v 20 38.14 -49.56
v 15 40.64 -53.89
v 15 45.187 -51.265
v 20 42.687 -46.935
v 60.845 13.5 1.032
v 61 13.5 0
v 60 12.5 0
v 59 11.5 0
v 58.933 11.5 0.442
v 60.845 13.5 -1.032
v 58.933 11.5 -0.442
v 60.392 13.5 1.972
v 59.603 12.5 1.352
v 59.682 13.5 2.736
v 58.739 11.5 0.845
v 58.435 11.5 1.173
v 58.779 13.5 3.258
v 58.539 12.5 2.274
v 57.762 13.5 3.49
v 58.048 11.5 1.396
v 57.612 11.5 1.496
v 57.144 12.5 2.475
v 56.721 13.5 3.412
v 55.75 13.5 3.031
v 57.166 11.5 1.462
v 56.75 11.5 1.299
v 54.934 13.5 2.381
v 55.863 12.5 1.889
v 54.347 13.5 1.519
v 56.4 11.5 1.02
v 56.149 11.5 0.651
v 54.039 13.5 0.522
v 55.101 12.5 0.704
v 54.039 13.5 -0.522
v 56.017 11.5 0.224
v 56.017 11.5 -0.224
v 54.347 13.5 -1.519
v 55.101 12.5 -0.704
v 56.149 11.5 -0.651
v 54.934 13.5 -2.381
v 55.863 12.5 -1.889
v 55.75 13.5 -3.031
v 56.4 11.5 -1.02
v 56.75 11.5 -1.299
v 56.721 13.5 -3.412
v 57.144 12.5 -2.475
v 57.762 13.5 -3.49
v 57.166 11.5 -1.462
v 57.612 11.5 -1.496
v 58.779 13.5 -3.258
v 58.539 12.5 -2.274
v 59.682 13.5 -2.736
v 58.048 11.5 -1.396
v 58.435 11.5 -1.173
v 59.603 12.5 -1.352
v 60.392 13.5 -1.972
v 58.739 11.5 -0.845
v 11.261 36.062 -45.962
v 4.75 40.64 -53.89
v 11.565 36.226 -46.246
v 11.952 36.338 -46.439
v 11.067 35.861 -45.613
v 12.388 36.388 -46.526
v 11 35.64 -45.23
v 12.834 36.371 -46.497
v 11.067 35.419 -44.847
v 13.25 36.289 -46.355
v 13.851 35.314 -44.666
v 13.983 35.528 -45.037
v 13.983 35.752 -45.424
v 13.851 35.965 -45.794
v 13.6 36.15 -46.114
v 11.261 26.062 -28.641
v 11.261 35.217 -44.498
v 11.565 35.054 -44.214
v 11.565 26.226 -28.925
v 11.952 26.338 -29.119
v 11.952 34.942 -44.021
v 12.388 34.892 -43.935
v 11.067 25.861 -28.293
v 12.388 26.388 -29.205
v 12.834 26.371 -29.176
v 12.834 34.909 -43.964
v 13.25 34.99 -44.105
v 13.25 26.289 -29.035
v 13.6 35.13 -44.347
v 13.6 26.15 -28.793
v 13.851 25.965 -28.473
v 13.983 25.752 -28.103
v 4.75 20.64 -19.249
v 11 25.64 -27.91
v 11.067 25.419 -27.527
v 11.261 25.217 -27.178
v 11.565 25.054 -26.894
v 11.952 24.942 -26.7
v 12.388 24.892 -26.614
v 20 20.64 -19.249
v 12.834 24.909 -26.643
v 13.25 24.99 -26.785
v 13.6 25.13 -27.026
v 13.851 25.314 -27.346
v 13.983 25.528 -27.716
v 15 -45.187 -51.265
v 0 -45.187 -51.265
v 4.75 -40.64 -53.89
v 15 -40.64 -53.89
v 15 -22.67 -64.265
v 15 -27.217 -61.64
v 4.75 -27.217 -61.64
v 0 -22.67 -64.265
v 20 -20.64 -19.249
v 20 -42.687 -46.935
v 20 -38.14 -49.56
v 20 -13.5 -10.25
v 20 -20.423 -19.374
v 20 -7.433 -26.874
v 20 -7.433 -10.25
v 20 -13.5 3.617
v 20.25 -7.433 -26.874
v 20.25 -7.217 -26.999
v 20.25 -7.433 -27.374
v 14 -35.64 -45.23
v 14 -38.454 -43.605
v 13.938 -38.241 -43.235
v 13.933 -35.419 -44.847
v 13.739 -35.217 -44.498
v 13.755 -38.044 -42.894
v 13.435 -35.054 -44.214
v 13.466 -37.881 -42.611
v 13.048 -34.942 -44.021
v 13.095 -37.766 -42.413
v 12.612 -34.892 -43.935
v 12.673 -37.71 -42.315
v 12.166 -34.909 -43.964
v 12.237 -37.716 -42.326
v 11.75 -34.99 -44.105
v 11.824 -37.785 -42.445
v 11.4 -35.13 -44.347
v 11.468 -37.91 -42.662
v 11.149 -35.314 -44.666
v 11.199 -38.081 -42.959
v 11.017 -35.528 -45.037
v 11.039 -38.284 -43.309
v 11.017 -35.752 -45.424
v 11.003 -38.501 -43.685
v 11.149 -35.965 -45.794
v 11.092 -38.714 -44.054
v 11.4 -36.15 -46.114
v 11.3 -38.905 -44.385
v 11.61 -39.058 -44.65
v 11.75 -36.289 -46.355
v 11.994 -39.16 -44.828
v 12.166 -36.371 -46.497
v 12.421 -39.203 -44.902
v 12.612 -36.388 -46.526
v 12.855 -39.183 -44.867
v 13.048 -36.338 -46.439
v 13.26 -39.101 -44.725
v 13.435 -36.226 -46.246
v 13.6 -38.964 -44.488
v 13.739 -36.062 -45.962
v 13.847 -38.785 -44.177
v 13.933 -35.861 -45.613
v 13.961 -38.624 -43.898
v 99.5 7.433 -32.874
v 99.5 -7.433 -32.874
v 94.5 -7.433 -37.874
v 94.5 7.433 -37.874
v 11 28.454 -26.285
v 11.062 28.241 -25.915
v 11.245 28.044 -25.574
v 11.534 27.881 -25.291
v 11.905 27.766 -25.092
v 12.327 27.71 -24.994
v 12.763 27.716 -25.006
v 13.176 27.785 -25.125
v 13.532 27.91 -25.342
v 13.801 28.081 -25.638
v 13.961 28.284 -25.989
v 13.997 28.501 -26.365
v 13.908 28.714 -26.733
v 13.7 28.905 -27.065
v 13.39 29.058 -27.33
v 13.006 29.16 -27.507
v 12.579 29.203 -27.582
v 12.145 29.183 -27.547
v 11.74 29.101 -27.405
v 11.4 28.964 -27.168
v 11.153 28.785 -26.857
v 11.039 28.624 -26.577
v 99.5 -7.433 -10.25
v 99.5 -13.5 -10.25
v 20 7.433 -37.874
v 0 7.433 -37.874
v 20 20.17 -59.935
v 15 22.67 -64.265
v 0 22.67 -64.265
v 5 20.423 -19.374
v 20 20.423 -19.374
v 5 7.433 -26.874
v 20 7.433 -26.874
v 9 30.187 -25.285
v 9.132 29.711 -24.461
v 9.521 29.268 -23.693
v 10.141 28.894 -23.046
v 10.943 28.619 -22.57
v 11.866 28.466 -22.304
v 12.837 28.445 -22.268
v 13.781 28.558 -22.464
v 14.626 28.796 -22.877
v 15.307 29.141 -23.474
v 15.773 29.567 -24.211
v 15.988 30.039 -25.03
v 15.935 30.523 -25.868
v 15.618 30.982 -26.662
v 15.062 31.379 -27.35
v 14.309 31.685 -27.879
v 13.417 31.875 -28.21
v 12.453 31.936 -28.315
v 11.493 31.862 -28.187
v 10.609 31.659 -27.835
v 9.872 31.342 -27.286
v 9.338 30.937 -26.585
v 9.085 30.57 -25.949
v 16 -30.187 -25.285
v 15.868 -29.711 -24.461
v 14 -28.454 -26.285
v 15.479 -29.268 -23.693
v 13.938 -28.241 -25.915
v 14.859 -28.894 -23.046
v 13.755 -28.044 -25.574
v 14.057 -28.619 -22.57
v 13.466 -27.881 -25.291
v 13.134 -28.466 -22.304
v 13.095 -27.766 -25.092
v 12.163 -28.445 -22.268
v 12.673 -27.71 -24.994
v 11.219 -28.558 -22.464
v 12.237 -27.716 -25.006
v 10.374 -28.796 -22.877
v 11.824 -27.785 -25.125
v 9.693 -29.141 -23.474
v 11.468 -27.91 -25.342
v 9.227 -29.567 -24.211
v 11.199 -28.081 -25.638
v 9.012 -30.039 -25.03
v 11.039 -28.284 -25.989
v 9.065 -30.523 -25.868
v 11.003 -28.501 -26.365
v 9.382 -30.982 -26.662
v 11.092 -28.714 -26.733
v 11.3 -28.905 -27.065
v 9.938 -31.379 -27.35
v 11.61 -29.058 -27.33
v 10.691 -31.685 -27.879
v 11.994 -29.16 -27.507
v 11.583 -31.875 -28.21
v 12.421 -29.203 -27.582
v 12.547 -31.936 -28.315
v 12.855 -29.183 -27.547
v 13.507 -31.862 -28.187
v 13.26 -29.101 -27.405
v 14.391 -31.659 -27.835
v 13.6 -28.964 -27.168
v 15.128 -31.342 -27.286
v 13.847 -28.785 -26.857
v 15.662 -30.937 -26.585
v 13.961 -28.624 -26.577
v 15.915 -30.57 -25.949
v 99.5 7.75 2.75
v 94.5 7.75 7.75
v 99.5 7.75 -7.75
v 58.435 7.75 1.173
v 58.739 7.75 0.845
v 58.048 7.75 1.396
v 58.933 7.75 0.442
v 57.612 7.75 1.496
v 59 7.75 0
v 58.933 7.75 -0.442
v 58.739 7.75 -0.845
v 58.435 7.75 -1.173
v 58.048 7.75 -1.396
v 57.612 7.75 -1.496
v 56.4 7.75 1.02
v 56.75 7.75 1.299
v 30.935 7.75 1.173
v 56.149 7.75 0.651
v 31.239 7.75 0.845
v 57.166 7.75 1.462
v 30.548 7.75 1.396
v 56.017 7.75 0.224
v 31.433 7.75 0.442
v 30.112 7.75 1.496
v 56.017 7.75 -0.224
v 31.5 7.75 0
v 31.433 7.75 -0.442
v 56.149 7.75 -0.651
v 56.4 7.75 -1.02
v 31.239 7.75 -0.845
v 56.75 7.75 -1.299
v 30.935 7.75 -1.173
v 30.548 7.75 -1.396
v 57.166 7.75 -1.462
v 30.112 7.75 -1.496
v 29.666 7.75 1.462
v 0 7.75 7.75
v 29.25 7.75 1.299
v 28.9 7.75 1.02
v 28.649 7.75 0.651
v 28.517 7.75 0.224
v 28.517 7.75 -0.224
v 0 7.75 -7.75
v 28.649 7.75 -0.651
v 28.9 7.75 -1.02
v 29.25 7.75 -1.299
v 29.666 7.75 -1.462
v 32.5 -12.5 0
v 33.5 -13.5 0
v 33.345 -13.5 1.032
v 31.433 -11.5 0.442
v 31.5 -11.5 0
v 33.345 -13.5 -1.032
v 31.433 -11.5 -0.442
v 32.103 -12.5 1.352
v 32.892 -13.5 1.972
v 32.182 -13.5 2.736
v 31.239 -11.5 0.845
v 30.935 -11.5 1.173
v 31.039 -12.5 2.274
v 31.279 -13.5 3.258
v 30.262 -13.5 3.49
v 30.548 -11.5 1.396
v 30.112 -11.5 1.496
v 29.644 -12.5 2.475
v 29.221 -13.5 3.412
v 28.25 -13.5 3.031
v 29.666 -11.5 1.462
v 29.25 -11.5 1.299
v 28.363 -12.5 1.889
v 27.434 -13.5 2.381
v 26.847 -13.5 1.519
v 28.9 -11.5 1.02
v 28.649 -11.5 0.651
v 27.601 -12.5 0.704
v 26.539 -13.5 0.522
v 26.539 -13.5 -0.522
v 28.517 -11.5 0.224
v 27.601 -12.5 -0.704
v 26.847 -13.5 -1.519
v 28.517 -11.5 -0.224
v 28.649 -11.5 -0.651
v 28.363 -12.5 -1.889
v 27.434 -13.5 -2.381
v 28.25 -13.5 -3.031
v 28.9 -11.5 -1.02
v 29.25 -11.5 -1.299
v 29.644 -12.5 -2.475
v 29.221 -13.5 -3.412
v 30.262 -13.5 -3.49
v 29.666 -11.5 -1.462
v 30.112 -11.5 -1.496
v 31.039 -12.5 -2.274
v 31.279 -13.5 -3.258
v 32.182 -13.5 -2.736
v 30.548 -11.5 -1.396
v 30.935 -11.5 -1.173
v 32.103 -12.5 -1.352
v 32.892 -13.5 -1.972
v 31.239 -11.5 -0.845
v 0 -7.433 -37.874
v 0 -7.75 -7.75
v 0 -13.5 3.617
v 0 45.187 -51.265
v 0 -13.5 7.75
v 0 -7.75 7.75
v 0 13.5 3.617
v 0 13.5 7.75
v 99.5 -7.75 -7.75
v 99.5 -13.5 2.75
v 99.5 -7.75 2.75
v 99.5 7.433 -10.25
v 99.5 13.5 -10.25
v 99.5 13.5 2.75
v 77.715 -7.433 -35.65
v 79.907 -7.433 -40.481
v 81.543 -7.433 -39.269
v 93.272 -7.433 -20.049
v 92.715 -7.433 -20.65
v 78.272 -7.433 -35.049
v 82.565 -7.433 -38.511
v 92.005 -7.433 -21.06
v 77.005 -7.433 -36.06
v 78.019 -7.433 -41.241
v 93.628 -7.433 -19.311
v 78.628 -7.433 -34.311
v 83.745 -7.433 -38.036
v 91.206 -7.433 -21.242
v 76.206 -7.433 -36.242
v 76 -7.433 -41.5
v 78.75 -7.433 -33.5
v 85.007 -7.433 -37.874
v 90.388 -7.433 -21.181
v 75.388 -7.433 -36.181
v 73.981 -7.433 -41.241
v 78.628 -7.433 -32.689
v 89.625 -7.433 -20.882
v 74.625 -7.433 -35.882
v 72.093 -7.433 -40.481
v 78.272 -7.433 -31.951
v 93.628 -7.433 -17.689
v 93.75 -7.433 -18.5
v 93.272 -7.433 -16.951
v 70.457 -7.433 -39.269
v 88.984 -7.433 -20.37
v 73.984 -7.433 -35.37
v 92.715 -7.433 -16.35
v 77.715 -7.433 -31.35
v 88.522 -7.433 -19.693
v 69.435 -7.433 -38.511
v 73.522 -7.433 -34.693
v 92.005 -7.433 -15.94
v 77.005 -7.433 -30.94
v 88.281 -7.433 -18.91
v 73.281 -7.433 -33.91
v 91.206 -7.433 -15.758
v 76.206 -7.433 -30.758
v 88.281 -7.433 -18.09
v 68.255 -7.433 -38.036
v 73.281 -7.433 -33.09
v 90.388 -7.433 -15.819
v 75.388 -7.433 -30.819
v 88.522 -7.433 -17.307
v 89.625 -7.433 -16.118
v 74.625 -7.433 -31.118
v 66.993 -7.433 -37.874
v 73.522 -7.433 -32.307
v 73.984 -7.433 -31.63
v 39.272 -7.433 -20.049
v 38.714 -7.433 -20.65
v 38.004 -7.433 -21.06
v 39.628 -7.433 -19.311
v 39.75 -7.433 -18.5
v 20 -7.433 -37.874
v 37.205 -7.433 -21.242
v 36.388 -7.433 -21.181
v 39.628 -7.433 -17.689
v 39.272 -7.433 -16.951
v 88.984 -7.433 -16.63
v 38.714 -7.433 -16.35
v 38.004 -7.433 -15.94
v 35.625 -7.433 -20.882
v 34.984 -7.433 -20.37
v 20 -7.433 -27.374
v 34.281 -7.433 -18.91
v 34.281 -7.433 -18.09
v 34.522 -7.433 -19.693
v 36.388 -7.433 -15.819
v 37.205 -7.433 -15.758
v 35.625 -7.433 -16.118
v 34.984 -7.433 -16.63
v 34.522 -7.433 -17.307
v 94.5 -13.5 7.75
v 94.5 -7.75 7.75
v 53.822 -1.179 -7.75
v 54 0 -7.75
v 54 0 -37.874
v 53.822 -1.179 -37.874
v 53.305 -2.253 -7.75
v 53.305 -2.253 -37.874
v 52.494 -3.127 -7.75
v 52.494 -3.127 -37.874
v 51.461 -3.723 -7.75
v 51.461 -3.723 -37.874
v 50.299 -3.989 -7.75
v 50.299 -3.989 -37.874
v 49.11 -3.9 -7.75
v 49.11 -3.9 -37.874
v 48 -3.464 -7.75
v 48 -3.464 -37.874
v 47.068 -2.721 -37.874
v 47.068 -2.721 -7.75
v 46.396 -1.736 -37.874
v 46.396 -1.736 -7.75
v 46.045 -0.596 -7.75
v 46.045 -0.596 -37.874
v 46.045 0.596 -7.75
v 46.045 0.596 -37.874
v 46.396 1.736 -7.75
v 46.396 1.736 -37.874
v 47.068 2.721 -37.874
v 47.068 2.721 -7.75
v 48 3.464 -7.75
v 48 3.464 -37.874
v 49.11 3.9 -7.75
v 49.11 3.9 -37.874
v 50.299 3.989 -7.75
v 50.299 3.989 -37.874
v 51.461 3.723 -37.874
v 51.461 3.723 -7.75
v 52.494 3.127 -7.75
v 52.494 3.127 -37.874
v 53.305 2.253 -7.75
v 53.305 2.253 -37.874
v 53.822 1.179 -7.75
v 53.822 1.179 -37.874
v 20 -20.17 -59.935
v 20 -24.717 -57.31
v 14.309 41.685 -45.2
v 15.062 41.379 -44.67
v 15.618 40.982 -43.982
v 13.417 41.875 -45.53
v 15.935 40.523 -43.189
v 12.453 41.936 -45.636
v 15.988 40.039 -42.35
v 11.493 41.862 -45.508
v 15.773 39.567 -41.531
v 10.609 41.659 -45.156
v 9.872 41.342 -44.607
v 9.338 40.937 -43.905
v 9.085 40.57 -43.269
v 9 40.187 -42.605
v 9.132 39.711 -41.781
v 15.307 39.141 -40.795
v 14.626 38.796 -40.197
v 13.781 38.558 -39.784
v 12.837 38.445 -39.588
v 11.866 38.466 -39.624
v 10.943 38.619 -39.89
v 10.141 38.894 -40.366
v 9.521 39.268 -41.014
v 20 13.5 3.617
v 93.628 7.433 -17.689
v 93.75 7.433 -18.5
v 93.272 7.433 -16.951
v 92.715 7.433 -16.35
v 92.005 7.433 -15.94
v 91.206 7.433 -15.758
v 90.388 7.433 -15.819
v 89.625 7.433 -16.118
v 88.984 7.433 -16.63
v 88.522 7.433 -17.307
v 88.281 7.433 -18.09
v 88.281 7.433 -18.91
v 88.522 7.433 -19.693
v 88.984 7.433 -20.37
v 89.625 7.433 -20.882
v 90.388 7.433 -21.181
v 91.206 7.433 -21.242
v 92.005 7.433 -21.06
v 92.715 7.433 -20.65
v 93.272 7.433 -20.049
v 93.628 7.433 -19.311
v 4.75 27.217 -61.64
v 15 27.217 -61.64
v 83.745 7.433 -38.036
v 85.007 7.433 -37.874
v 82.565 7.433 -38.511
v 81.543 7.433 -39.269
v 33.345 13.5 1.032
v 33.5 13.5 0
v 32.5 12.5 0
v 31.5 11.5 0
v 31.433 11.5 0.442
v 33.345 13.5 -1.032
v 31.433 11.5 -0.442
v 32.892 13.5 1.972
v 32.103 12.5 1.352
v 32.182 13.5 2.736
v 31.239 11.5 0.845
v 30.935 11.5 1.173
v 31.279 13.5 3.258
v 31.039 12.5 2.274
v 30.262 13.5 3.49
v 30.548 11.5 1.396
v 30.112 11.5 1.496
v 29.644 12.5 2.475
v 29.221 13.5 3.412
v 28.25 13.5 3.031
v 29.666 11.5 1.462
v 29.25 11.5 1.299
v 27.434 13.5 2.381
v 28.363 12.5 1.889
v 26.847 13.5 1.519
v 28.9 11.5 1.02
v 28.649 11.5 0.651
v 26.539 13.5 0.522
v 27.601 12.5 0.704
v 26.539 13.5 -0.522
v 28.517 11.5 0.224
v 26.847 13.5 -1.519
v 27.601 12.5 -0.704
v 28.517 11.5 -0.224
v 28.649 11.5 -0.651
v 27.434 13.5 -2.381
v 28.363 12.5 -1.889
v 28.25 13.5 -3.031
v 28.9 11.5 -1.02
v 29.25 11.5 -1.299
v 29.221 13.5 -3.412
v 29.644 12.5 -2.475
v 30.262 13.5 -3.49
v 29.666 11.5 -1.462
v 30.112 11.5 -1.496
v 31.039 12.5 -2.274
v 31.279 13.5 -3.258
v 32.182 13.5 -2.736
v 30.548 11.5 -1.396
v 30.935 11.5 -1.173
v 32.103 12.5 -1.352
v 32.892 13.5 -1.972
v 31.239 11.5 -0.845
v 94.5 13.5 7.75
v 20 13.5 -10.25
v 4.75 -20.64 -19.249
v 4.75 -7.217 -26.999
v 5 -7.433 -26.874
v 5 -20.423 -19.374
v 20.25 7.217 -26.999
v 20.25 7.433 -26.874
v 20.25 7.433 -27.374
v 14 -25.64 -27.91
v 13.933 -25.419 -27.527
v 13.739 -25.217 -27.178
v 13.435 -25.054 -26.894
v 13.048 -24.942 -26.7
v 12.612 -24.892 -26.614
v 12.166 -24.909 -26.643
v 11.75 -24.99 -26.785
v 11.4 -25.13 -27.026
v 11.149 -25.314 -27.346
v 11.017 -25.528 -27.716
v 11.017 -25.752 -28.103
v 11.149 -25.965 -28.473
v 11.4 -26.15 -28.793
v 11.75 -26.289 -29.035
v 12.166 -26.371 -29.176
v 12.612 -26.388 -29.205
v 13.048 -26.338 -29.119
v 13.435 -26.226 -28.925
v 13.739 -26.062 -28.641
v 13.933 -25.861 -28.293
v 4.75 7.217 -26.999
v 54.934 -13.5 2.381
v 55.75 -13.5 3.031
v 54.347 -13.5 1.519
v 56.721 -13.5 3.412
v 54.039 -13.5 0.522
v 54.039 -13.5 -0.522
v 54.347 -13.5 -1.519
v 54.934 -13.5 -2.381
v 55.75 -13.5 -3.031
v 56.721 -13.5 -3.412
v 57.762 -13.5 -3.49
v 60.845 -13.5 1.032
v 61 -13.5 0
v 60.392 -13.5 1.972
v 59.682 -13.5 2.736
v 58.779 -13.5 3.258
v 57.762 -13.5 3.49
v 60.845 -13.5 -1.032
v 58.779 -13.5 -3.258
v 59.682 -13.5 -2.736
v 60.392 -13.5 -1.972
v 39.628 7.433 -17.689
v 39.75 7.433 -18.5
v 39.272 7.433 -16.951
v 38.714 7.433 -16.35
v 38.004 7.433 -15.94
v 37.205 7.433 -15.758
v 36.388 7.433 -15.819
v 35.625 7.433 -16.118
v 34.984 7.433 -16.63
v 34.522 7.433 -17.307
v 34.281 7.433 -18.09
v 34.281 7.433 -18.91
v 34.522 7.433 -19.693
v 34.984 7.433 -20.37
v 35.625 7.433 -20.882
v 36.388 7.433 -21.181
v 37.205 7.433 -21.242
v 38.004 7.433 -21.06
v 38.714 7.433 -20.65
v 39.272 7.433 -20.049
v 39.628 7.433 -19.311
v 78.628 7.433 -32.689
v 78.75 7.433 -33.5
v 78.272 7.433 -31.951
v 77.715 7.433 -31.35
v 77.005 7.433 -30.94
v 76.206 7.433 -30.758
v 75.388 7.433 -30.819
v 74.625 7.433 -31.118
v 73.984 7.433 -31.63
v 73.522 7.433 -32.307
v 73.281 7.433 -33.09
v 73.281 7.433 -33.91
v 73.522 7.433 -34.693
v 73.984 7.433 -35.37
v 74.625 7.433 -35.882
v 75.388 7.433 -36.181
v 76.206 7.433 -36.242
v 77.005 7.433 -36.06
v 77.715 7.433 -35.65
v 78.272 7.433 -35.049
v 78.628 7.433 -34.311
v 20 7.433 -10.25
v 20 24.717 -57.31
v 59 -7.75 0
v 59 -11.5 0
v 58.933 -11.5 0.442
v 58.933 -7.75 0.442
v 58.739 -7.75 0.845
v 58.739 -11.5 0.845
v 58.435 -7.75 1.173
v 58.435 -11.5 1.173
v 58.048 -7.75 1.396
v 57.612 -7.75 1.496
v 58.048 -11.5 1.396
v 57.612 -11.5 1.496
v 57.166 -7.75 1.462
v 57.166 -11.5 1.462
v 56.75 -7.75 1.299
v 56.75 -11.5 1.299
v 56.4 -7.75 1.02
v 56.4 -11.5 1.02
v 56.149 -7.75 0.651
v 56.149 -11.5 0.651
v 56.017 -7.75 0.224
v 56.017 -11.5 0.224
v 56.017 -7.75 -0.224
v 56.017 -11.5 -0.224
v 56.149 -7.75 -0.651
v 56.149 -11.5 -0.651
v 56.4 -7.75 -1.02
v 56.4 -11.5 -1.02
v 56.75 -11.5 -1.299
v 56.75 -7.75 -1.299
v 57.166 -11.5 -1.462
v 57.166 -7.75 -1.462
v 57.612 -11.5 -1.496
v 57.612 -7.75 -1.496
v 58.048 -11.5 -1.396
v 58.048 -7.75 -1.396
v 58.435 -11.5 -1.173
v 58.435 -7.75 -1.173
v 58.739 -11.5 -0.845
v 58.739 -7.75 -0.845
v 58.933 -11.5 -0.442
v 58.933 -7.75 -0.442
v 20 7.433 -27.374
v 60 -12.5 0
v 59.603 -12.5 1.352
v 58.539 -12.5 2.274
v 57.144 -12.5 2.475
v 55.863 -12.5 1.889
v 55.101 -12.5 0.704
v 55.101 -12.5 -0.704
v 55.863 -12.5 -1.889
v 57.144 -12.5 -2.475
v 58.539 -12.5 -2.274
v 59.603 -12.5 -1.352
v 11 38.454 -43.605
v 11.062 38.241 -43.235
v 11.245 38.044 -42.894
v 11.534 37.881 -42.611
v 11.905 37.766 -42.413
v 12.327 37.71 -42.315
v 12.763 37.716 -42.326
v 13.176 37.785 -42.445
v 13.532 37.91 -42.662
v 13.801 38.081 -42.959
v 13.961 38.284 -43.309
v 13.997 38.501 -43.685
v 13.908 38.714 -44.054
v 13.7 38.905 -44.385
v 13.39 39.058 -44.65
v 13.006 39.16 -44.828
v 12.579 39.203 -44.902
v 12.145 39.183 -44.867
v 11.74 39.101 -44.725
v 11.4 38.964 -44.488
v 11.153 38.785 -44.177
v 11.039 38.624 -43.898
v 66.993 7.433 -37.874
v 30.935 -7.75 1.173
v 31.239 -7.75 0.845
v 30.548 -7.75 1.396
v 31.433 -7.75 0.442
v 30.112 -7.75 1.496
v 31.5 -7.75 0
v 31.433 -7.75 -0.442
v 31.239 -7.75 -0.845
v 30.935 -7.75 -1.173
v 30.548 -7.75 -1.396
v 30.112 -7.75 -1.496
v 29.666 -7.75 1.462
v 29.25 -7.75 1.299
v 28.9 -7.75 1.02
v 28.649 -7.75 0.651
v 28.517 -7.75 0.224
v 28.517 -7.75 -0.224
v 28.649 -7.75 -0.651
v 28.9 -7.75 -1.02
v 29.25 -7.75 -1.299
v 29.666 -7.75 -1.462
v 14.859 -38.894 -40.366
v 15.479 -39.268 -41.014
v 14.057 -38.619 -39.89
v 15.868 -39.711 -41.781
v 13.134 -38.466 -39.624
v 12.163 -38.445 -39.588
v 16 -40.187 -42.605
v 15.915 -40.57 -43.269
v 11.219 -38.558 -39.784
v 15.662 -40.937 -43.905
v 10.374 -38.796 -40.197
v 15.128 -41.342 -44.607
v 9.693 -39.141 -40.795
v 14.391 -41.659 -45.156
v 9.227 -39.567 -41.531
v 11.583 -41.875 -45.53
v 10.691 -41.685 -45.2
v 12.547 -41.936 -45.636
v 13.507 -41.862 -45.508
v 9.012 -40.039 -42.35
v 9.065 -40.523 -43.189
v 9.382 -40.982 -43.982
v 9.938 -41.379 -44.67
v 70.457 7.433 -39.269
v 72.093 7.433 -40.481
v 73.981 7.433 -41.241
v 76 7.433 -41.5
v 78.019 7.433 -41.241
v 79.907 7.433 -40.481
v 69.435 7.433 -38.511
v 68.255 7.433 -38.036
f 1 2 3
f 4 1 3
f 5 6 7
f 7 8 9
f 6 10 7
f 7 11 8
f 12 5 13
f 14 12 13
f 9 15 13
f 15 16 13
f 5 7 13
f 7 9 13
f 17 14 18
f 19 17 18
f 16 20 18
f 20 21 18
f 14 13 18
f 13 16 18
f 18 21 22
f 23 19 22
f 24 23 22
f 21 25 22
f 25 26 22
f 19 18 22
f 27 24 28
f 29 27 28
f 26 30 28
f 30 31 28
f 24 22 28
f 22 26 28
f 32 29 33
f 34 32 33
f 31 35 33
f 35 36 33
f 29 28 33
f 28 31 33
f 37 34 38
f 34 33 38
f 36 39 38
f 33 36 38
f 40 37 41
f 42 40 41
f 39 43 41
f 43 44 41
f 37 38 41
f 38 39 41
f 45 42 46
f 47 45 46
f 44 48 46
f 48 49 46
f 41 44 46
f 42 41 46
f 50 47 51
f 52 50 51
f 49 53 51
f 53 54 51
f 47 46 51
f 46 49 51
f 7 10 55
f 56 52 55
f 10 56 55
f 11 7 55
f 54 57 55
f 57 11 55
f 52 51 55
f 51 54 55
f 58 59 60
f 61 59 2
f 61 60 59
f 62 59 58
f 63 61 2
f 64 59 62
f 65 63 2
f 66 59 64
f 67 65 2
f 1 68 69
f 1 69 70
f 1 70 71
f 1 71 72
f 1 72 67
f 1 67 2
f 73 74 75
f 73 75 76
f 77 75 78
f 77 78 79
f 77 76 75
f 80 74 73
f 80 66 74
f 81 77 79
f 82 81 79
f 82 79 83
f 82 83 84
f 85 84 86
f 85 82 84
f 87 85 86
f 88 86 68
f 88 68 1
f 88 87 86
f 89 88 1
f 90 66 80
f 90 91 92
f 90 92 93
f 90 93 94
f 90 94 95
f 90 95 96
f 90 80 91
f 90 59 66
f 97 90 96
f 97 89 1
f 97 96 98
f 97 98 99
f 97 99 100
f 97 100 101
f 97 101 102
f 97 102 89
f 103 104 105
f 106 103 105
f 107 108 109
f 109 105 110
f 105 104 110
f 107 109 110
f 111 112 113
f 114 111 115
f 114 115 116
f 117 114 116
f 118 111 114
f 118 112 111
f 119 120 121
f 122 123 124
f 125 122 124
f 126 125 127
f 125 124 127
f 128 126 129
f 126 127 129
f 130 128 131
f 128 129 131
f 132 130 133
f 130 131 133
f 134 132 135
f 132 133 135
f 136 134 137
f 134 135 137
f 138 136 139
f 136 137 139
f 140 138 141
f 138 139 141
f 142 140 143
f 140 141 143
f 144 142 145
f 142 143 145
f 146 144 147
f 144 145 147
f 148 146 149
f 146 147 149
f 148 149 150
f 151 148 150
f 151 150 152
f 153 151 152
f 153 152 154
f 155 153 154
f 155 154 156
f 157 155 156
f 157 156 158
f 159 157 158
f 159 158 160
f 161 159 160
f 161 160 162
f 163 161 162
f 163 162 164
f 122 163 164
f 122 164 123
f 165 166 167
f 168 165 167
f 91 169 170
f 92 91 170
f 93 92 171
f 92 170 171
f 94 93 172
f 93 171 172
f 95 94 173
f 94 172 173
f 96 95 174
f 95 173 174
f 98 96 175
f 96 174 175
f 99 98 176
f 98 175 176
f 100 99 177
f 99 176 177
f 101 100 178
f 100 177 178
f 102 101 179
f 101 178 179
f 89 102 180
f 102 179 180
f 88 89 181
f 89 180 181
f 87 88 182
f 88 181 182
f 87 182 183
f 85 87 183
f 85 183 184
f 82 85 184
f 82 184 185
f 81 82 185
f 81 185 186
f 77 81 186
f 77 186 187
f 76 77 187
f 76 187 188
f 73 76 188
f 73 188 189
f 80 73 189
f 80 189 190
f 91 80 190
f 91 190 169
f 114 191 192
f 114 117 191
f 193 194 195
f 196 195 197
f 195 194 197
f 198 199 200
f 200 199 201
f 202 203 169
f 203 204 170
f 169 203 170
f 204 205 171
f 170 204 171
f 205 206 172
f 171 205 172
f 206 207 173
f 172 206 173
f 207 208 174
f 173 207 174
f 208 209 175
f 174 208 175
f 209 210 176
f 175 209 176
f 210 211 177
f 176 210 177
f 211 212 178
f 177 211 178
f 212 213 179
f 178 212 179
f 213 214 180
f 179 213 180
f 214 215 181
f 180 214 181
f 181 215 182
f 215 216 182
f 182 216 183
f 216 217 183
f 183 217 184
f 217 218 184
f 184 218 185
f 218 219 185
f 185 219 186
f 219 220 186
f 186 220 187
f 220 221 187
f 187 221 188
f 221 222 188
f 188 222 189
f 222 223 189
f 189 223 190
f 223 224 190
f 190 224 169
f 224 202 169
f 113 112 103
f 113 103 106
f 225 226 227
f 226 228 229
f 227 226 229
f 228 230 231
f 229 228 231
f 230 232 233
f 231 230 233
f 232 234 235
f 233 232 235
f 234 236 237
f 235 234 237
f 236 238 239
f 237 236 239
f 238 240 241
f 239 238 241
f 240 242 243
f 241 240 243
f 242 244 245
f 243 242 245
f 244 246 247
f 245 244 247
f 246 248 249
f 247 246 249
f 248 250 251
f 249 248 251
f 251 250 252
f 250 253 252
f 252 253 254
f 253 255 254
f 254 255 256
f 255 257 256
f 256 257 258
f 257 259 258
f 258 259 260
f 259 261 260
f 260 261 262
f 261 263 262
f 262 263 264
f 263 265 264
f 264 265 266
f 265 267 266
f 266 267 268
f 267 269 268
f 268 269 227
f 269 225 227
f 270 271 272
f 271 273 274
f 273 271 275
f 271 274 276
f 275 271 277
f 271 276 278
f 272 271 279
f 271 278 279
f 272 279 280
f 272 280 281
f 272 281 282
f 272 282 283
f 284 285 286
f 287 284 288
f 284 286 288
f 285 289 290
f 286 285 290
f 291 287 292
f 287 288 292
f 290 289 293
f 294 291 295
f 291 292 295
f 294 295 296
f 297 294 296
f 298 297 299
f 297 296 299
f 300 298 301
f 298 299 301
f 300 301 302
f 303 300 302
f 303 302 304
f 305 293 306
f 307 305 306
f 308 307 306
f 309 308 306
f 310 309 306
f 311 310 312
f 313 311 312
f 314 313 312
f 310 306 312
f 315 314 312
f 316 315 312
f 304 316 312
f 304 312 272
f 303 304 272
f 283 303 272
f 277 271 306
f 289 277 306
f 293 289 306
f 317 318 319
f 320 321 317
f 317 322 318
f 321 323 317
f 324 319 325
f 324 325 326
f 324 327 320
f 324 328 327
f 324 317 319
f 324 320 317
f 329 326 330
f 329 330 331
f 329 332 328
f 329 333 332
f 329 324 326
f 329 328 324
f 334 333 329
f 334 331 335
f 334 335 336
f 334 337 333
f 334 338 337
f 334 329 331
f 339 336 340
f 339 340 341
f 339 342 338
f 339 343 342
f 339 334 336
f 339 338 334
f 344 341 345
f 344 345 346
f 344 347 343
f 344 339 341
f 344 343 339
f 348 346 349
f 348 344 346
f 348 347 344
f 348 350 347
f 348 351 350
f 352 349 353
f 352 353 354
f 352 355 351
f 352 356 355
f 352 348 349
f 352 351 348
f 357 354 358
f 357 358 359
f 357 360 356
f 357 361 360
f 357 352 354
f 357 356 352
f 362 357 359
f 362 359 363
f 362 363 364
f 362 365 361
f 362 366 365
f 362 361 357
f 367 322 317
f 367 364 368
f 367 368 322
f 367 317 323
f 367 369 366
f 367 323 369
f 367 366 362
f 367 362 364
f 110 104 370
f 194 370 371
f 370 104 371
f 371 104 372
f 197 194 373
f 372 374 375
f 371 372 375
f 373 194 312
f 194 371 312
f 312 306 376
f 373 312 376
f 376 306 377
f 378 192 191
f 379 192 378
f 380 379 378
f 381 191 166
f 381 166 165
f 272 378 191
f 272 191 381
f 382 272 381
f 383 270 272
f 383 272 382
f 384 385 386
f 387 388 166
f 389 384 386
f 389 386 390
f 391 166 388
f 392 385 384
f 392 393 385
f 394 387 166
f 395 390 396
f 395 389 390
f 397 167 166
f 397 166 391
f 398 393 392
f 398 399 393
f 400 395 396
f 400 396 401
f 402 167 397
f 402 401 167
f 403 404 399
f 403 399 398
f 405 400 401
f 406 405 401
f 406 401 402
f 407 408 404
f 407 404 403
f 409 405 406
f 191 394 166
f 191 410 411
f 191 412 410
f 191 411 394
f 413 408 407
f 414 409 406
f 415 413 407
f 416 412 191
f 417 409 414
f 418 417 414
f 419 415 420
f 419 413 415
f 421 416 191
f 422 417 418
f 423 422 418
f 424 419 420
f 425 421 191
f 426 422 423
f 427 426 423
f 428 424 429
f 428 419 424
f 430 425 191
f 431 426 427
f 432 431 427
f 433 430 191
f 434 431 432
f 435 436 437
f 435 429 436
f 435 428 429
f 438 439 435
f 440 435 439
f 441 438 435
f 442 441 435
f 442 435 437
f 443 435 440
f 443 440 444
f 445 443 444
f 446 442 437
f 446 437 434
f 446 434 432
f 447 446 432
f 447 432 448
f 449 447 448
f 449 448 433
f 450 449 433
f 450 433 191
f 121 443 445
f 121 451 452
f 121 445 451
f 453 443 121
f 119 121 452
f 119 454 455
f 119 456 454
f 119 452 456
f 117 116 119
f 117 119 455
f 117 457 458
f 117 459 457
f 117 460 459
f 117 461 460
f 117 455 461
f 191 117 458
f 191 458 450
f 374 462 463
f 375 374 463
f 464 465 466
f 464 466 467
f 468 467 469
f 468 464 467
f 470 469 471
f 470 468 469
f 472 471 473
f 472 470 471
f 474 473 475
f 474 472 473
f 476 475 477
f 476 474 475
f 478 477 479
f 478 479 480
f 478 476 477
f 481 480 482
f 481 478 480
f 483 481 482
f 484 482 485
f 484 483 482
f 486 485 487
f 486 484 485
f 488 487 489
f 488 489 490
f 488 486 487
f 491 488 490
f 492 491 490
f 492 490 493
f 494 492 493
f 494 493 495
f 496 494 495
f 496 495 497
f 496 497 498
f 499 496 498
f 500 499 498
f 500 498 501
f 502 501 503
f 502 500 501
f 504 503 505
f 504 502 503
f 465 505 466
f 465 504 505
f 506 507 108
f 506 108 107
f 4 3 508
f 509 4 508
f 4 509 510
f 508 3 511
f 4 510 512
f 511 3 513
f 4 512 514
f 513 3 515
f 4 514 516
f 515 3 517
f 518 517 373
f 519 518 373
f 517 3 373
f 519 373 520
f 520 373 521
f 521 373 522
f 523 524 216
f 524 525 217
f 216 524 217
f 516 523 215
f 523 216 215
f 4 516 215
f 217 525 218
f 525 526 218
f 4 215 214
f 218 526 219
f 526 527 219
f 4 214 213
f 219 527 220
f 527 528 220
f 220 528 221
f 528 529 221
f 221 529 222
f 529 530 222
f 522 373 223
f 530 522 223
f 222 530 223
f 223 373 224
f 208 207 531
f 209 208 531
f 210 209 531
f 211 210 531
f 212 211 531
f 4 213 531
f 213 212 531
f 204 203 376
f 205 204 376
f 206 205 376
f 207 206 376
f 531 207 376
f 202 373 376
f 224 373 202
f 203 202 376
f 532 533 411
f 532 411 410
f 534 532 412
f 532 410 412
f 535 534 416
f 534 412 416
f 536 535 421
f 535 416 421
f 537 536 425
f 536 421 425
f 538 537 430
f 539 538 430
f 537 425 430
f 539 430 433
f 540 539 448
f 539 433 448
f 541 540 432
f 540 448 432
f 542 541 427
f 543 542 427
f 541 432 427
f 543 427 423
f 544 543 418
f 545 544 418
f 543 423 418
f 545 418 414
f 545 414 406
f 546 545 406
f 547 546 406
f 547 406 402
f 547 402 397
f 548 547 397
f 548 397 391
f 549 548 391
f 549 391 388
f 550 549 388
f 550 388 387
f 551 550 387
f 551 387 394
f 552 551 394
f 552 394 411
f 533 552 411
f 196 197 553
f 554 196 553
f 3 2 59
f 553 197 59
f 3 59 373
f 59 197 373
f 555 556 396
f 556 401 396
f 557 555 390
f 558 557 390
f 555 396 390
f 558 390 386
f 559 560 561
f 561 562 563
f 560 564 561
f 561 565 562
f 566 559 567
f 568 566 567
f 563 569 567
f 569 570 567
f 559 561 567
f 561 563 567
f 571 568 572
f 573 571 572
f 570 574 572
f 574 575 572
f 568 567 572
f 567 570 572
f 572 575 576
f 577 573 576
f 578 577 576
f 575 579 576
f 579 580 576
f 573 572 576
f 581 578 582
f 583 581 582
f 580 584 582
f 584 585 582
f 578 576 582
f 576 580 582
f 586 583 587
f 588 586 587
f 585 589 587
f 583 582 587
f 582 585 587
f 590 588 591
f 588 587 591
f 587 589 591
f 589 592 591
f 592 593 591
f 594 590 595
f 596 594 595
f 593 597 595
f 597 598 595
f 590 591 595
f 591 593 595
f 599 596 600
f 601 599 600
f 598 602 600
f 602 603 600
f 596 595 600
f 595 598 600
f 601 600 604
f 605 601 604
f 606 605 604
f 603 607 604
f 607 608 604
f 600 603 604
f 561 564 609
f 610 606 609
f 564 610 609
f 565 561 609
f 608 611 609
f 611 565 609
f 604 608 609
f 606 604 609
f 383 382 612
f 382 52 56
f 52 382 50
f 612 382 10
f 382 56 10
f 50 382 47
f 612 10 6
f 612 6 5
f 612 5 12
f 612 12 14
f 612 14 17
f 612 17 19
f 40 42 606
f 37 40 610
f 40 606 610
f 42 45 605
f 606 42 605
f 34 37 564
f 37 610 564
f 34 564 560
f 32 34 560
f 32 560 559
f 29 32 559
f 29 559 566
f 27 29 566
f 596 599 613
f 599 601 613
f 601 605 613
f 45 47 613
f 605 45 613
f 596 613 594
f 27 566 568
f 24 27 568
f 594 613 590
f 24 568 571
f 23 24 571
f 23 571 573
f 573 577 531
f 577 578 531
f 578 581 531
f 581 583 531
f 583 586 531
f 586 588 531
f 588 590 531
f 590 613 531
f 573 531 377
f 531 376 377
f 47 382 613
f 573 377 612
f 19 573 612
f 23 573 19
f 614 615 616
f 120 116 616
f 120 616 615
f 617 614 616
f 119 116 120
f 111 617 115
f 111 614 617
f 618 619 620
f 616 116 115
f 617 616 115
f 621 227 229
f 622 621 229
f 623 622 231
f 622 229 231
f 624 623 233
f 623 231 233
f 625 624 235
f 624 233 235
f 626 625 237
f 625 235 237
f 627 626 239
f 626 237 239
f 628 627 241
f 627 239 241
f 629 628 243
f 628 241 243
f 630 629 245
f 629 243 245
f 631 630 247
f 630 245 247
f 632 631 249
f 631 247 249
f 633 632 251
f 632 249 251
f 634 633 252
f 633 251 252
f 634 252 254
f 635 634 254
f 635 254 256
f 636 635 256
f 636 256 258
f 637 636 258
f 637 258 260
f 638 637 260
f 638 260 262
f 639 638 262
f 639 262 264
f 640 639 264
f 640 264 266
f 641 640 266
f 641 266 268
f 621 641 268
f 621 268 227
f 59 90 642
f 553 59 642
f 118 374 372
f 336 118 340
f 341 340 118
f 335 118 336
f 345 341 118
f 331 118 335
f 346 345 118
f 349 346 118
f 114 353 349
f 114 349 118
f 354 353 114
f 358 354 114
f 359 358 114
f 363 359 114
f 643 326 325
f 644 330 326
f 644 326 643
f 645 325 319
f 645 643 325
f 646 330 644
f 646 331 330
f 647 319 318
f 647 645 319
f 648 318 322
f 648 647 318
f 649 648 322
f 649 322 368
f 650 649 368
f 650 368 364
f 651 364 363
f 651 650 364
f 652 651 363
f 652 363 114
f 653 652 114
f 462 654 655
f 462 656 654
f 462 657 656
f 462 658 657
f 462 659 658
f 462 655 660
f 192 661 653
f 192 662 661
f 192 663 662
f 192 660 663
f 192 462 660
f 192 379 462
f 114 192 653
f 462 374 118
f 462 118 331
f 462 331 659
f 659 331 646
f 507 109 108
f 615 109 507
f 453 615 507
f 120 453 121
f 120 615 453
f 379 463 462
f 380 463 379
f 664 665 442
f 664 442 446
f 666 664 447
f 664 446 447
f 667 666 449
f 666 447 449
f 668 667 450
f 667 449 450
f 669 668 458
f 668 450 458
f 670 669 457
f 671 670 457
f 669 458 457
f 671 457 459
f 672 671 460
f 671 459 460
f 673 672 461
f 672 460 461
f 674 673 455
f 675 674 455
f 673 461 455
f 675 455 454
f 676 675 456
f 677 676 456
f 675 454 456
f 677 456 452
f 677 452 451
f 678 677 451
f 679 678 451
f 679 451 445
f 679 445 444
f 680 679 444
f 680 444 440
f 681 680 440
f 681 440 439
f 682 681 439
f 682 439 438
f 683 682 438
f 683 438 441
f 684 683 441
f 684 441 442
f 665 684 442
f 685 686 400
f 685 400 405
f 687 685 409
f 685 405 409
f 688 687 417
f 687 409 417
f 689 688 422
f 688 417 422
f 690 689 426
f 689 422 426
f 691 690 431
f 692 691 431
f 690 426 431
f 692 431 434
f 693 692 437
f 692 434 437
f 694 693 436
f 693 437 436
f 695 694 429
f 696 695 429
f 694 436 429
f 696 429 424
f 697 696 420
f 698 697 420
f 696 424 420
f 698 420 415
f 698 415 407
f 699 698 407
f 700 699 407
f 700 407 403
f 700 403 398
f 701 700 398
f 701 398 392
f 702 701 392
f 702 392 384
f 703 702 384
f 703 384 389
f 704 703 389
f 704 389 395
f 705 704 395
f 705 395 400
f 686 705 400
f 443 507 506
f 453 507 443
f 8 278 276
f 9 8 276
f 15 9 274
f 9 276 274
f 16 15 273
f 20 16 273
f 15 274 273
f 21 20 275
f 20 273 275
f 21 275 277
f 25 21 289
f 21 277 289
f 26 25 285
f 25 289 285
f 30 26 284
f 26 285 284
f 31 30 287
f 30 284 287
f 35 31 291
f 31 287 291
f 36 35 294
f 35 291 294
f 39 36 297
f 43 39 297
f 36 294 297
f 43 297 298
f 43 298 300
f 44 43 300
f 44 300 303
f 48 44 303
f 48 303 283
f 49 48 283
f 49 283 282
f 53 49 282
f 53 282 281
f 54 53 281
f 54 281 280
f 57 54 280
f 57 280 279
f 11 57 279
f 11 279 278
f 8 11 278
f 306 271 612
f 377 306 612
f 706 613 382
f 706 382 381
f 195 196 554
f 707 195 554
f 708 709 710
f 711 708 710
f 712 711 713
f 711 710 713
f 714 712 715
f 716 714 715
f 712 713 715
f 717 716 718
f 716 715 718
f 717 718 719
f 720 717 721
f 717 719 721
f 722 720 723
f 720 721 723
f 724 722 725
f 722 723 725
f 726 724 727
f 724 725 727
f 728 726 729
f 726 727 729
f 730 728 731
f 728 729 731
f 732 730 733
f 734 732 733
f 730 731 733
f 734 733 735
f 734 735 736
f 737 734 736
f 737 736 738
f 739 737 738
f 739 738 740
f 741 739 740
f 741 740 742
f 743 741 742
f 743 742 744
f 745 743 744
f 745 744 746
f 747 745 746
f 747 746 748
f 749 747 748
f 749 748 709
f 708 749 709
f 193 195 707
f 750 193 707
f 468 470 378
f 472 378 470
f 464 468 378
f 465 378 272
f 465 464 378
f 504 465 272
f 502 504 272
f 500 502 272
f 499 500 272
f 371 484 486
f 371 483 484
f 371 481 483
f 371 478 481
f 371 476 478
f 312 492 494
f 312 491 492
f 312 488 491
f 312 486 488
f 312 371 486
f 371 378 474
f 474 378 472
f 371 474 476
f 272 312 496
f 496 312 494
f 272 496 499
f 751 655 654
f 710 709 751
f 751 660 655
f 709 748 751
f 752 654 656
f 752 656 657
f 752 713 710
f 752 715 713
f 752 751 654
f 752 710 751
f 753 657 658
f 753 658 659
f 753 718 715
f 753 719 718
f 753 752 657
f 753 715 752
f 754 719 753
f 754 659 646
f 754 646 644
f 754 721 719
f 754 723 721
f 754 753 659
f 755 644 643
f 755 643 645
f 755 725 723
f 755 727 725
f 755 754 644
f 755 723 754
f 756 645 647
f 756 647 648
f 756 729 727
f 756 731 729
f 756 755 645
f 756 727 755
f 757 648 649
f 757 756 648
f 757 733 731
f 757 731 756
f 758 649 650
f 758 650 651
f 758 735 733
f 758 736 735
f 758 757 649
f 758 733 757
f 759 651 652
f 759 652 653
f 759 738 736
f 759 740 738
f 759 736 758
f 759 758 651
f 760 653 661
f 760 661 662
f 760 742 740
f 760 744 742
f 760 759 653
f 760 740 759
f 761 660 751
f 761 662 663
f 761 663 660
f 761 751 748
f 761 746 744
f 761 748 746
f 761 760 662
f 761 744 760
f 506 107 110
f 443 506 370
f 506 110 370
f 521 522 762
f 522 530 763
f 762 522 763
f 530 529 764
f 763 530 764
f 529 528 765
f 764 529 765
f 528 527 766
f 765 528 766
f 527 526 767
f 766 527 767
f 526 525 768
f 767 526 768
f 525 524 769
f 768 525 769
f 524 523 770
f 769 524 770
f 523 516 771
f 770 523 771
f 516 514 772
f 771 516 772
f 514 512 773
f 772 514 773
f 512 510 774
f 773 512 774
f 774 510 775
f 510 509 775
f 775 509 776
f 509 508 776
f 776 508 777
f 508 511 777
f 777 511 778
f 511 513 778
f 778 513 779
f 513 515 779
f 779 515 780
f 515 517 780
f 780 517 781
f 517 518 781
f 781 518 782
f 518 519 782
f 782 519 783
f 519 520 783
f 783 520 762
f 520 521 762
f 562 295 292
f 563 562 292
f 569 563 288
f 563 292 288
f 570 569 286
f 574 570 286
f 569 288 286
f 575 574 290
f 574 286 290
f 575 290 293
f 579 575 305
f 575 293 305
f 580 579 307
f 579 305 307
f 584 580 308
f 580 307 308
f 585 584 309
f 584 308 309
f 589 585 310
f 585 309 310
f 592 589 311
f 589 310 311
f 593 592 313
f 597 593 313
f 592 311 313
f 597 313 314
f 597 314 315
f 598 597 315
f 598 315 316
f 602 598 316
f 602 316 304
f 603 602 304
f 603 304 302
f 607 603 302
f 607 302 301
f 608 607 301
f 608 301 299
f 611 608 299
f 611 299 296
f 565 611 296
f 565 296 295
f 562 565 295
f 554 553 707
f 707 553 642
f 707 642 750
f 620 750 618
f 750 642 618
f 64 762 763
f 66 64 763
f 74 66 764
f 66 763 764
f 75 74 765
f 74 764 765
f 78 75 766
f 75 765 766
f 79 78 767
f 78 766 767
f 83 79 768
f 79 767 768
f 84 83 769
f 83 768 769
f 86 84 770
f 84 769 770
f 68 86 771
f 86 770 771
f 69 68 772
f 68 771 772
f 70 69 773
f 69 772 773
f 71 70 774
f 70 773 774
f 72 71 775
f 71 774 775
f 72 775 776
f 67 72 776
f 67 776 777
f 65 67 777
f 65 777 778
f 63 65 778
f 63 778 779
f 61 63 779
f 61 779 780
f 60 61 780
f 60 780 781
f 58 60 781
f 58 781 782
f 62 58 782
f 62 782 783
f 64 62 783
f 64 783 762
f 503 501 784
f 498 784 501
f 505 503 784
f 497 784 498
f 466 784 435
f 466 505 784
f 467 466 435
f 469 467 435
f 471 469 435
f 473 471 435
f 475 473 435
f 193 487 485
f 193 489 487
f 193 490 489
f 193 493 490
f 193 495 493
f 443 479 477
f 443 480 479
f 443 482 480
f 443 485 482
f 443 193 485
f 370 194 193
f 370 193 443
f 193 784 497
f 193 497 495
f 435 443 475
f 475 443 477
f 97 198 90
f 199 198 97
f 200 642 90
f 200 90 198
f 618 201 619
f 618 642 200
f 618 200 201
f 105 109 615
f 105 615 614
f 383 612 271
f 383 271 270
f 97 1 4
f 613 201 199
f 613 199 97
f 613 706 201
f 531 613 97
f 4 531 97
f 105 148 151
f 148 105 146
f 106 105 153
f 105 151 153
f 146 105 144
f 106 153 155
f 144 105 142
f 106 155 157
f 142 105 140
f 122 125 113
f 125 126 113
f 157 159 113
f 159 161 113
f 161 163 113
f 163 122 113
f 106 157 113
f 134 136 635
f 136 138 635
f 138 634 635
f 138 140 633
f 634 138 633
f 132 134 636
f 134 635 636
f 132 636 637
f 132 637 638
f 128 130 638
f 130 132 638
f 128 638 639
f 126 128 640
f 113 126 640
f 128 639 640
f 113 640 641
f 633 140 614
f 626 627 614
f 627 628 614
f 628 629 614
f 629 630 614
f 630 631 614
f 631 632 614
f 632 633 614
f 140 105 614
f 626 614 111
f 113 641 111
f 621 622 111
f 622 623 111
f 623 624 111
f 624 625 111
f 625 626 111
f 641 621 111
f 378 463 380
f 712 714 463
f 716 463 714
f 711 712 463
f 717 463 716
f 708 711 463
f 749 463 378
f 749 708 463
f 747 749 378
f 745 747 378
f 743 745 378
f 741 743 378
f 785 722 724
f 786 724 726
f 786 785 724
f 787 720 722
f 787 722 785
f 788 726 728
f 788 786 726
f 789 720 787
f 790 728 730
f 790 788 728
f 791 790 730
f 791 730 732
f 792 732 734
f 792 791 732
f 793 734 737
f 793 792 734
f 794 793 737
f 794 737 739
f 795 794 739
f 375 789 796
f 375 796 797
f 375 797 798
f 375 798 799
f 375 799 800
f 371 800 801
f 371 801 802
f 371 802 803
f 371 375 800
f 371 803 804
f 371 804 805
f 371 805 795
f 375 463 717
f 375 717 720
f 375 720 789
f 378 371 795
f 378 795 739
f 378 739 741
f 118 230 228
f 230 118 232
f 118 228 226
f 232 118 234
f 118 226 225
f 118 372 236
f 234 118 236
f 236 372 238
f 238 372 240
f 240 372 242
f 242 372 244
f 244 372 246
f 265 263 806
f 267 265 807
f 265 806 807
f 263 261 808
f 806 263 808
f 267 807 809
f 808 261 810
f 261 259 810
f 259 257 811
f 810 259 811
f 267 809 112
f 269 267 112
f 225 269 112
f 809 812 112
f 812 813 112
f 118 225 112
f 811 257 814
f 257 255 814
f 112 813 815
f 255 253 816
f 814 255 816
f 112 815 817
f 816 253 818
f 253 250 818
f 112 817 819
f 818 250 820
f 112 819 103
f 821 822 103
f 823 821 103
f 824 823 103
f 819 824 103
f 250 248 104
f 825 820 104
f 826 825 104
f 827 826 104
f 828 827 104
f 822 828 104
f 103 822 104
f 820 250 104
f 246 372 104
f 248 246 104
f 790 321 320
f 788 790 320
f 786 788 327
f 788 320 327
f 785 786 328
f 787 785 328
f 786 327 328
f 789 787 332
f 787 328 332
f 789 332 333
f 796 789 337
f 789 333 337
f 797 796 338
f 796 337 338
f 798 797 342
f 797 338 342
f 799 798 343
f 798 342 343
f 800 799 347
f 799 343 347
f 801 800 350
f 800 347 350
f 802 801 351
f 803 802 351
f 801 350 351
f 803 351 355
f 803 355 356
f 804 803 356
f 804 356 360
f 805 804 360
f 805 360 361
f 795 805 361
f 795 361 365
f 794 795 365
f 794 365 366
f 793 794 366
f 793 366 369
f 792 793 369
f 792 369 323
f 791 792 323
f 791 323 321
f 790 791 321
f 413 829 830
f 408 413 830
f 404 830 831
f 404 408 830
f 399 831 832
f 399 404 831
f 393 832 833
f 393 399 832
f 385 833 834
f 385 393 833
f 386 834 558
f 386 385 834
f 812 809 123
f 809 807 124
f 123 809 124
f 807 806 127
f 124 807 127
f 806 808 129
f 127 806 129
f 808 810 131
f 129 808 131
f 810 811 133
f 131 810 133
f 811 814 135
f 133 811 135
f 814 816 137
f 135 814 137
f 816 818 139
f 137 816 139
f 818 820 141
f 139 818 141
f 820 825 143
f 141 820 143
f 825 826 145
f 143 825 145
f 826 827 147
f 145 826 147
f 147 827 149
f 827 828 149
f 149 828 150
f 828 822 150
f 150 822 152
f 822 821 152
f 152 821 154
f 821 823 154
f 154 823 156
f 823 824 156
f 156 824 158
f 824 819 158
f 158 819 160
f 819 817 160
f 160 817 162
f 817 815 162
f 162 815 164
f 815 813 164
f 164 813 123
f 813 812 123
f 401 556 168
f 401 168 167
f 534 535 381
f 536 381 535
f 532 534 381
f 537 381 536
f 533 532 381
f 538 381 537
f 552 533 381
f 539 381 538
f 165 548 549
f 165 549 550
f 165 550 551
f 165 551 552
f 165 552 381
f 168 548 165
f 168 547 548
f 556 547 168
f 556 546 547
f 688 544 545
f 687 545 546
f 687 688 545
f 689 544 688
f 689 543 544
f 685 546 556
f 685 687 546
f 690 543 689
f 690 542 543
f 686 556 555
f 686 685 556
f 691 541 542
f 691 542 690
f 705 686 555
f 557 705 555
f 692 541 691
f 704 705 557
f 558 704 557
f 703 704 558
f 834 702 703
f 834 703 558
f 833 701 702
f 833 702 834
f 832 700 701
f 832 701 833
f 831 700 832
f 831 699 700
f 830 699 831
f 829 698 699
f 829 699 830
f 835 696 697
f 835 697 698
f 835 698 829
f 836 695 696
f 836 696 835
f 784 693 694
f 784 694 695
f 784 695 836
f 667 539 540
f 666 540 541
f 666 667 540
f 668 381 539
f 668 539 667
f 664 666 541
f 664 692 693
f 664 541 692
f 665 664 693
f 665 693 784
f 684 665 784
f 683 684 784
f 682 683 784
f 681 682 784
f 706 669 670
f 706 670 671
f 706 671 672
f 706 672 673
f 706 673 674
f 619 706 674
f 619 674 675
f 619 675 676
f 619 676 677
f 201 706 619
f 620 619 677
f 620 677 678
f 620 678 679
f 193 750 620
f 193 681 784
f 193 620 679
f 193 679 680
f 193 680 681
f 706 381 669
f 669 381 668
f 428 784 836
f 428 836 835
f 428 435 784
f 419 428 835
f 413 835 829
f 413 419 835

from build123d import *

# Parameters (mm, degrees)
F0_W         = 15
F0_H         = 15
F1_DEPTH     = 20
F3_DEPTH     = 15
F4_R         = 1.5
F5_DEPTH     = 5.5
F6_R         = 1.5
F7_DEPTH     = 5.5
F8_W         = 15
F8_H         = 15
F9_DEPTH     = 47.5
F10_R        = 4
F11_DEPTH    = 19.374355653
F13_DEPTH    = 47.5
F14_R        = 2.75
F15_DEPTH    = 52.6205461814
F16_DEPTH    = 20
F17_W        = 67.5
F17_H        = 14.8660254038
F17_R        = 4
F18_DEPTH    = 11
F19_W        = 14.8660254038
F19_H        = 26.3910161514
F20_DEPTH    = 67.501
F21_SIZE     = 5
F22_R        = 1.5
F23_DEPTH    = 58.6875334795
F24_W        = 15.5
F24_H        = 15.5
F25_DEPTH    = 67.501
F26_W        = 15.5
F26_H        = 15.5
F27_DEPTH    = 51.2593302492
F28_W        = 15.5
F28_H        = 15.5
F29_DEPTH    = 51.2593302492
F30_DEPTH    = 32
F31_R        = 2.75
F32_DEPTH    = 52.6205461814
F33_R        = 8
F33_R_2      = 2.75
F34_DEPTH    = 14.8660254038
F36_DEPTH    = 99.5
F37_W        = 27
F37_H        = 4.75
F38_DEPTH    = 99.501
F39_T1_DEPTH = 40.5828552834
F39_T3_DEPTH = 31.4668298797
F39_T5_DEPTH = 31.4668298797
F40_R        = 5
F41_SIZE     = 2


# Not quite as in the source:
# - a fillet or chamfer that OpenCascade refuses, or shapes differently, is made with other operations: its cross-section is extruded or revolved along the edge and cut away or added
# - an extrude ends at something that could not be found from the text; its depth is read off the source's solid


with BuildPart() as f1:
    # F0 (on Right) → F1 (new body)
    with BuildSketch(Plane.YZ):
        Polygon((45.1865334795, -51.2653718044), (8.3715789032, 12.5), (-8.3715789032, 12.5), (-45.1865334795, -51.2653718044), (-22.6698729811, -64.2653718044), (0, -25), (22.6698729811, -64.2653718044), align=None)
        Rectangle(F0_W, F0_H, mode=Mode.SUBTRACT)
    extrude(amount=F1_DEPTH)

    # F2 (on face) → F3 (cut)
    with BuildSketch(Plane.YZ.offset(20)):
        Polygon((-20.4233937587, -19.374355653), (-40.4233937587, -54.0153718044), (-27.4330127019, -61.5153718044), (-7.4330127019, -26.874355653), align=None)
        Polygon((27.4330127019, -61.5153718044), (40.4233937587, -54.0153718044), (20.4233937587, -19.374355653), (7.4330127019, -26.874355653), align=None)
    extrude(amount=-F3_DEPTH, mode=Mode.SUBTRACT)

    # F4 (on face) → F5 (cut, through all)
    with BuildSketch(Plane(origin=(0, -11.6913429511, 6.75), x_dir=(1, 0, 0), z_dir=(0, -0.8660254038, 0.5))):
        with Locations((12.5, -36.9903810568)):
            Circle(F4_R)
        with Locations((12.5, -56.9903810568)):
            Circle(F4_R)
    extrude(amount=-F5_DEPTH, mode=Mode.SUBTRACT)

    # F6 (on face) → F7 (cut, through all)
    with BuildSketch(Plane(origin=(0, 11.6913429511, 6.75), x_dir=(-1, 0, 0), z_dir=(0, 0.8660254038, 0.5))):
        with Locations((-12.5, -56.9903810568)):
            Circle(F6_R)
        with Locations((-12.5, -36.9903810568)):
            Circle(F6_R)
    extrude(amount=-F7_DEPTH, mode=Mode.SUBTRACT)

    # F8 (on face) → F9 (join)
    with BuildSketch(Plane.YZ.offset(20)):
        Polygon((8.3715789032, 12.5), (-8.3715789032, 12.5), (-13.5, 3.6173140978), (-13.5, -23.3715789032), (-7.4330127019, -26.874355653), (7.4330127019, -26.874355653), (13.5, -23.3715789032), (13.5, 3.6173140978), align=None)
        Rectangle(F8_W, F8_H, mode=Mode.SUBTRACT)
    extrude(amount=F9_DEPTH)

    # F10 (on face) → F11 (cut, through all)
    with BuildSketch(Plane(origin=(0, 0, -26.874355653), x_dir=(1, 0, 0), z_dir=(0, 0, -1))):
        with Locations((50, 0)):
            Circle(F10_R)
    extrude(amount=-F11_DEPTH, mode=Mode.SUBTRACT)

    # F12 (on face) → F13 (cut, through all)
    with BuildSketch(Plane.YZ.offset(67.5)):
        Polygon((-13.5, -23.3715789032), (-7.4330127019, -26.874355653), (-7.4330127019, -10.25), (-13.5, -10.25), align=None)
        Polygon((7.4330127019, -10.25), (7.4330127019, -26.874355653), (13.5, -23.3715789032), (13.5, -10.25), align=None)
    extrude(amount=-F13_DEPTH, mode=Mode.SUBTRACT)

    # F14 (on face) → F15 (cut, through all)
    with BuildSketch(Plane.XZ.offset(7.4330127019)):
        with Locations((36.9997965198, -18.5)):
            Circle(F14_R)
    extrude(amount=-F15_DEPTH, mode=Mode.SUBTRACT)

    # F16 (add, through all): a face of the model
    f16_faces = [f1.faces().sort_by_distance(p)[0] for p in [
        (20, 0, -26.2495704353),
    ]]
    extrude(f16_faces, amount=F16_DEPTH)

    # F17 (on face) → F18 (join, through all)
    with BuildSketch(Plane(origin=(0, 0, -26.874355653), x_dir=(1, 0, 0), z_dir=(0, 0, -1))):
        with Locations((33.75, 0)):
            Rectangle(F17_W, F17_H)
        with Locations((50, 0)):
            Circle(F17_R, mode=Mode.SUBTRACT)
    extrude(amount=F18_DEPTH)

    # F19 (on face) → F20 (cut, through all)
    with BuildSketch(Plane(origin=(0, 0, 0), x_dir=(0, -1, 0), z_dir=(-1, 0, 0))):
        with Locations((0, -51.0698637287)):
            Rectangle(F19_W, F19_H)
    extrude(amount=-F20_DEPTH, mode=Mode.SUBTRACT)

    # F21
    f21_edges = [f1.edges().sort_by_distance(p)[0] for p in [
        (20, -42.804964, -52.640372),
        (20, -25.051443, -62.890372),
        (20, 25.051443, -62.890372),
        (20, 42.804964, -52.640372),
    ]]
    chamfer(f21_edges, length=F21_SIZE)

    # F22 (on face) → F23 (cut, through all)
    with BuildSketch(Plane.XZ.offset(13.5)):
        with Locations((30, 0)):
            Circle(F22_R)
        with Locations((57.5, 0)):
            Circle(F22_R)
    extrude(amount=-F23_DEPTH, mode=Mode.SUBTRACT)

    # F24 (on face) → F25 (cut, through all)
    with BuildSketch(Plane(origin=(0, 0, 0), x_dir=(0, -1, 0), z_dir=(-1, 0, 0))):
        Rectangle(F24_W, F24_H)
    extrude(amount=-F25_DEPTH, mode=Mode.SUBTRACT)

    # F26 (on face) → F27 (cut, through all)
    with BuildSketch(Plane(origin=(0, -13.4951905284, -23.374355653), x_dir=(1, 0, 0), z_dir=(0, -0.5, -0.8660254038))):
        with Locations((12.5, 0.5)):
            Rectangle(F26_W, F26_H)
    extrude(amount=F27_DEPTH, mode=Mode.SUBTRACT)

    # F28 (on face) → F29 (cut, through all)
    with BuildSketch(Plane(origin=(0, 13.4951905284, -23.374355653), x_dir=(1, 0, 0), z_dir=(0, 0.5, -0.8660254038))):
        with Locations((12.5, -0.5)):
            Rectangle(F28_W, F28_H)
    extrude(amount=F29_DEPTH, mode=Mode.SUBTRACT)

    # F30 (add): a face of the model
    f30_faces = [f1.faces().sort_by_distance(p)[0] for p in [
        (67.5, 0, -13.0224065519),
    ]]
    extrude(f30_faces, amount=F30_DEPTH)

    # F31 (on face) → F32 (cut, through all)
    with BuildSketch(Plane.XZ.offset(7.4330127019)):
        with Locations((91, -18.5)):
            Circle(F31_R)
        with Locations((76, -33.5)):
            Circle(F31_R)
    extrude(amount=-F32_DEPTH, mode=Mode.SUBTRACT)

    # F33 (on face) → F34 (join, through all)
    with BuildSketch(Plane.XZ.offset(7.4330127019)):
        with Locations((76, -33.5)):
            Circle(F33_R)
        with Locations((76, -33.5)):
            Circle(F33_R_2, mode=Mode.SUBTRACT)
    extrude(amount=-F34_DEPTH)

    # F35 (on face) → F36 (join, through all)
    with BuildSketch(Plane.YZ.offset(99.5)):
        Polygon((-13.5, 3.6173140978), (-8.3715789032, 12.5), (-13.5, 12.5), align=None)
        Polygon((13.5, 12.5), (8.3715789032, 12.5), (13.5, 3.6173140978), align=None)
    extrude(amount=-F36_DEPTH)

    # F37 (on face) → F38 (cut, through all)
    with BuildSketch(Plane.YZ.offset(99.5)):
        with Locations((0, 10.125)):
            Rectangle(F37_W, F37_H)
    extrude(amount=-F38_DEPTH, mode=Mode.SUBTRACT)

    # F39: chamfer of 5 on 5 edges, made by hand

    # F39_s2 → F39_t1 (cut)
    with BuildSketch(Plane.XZ.offset(-20.2914276417)):
        Polygon((99.5, -32.874355653), (94.5, -37.874355653), (99.5, -37.874355653), align=None)
    extrude(amount=F39_T1_DEPTH, mode=Mode.SUBTRACT)

    # F39_s4 → F39_t3 (cut)
    with BuildSketch(Plane.XZ.offset(-5.1084149398)):
        Polygon((94.5, 7.75), (99.5, 2.75), (99.5, 7.75), align=None)
    extrude(amount=F39_T3_DEPTH, mode=Mode.SUBTRACT)

    # F39_s6 → F39_t5 (cut)
    with BuildSketch(Plane.XZ.offset(-26.3584149398)):
        Polygon((94.5, 7.75), (99.5, 2.75), (99.5, 7.75), align=None)
    extrude(amount=F39_T5_DEPTH, mode=Mode.SUBTRACT)

    # F40
    f40_edges = [f1.edges().sort_by_distance(p)[0] for p in [
        (69.301865, 0, -37.874356),
        (82.698135, 0, -37.874356),
    ]]
    fillet(f40_edges, radius=F40_R)

    # F41
    f41_edges = [f1.edges().sort_by_distance(p)[0] for p in [
        (28.5, -13.5, 0),
        (56, -13.5, 0),
        (11, -30.186533, -25.28461),
        (11, -40.186533, -42.605118),
        (56, 13.5, 0),
        (28.5, 13.5, 0),
        (14, 30.186533, -25.28461),
        (14, 40.186533, -42.605118),
    ]]
    chamfer(f41_edges, length=F41_SIZE)


solid = f1.part
